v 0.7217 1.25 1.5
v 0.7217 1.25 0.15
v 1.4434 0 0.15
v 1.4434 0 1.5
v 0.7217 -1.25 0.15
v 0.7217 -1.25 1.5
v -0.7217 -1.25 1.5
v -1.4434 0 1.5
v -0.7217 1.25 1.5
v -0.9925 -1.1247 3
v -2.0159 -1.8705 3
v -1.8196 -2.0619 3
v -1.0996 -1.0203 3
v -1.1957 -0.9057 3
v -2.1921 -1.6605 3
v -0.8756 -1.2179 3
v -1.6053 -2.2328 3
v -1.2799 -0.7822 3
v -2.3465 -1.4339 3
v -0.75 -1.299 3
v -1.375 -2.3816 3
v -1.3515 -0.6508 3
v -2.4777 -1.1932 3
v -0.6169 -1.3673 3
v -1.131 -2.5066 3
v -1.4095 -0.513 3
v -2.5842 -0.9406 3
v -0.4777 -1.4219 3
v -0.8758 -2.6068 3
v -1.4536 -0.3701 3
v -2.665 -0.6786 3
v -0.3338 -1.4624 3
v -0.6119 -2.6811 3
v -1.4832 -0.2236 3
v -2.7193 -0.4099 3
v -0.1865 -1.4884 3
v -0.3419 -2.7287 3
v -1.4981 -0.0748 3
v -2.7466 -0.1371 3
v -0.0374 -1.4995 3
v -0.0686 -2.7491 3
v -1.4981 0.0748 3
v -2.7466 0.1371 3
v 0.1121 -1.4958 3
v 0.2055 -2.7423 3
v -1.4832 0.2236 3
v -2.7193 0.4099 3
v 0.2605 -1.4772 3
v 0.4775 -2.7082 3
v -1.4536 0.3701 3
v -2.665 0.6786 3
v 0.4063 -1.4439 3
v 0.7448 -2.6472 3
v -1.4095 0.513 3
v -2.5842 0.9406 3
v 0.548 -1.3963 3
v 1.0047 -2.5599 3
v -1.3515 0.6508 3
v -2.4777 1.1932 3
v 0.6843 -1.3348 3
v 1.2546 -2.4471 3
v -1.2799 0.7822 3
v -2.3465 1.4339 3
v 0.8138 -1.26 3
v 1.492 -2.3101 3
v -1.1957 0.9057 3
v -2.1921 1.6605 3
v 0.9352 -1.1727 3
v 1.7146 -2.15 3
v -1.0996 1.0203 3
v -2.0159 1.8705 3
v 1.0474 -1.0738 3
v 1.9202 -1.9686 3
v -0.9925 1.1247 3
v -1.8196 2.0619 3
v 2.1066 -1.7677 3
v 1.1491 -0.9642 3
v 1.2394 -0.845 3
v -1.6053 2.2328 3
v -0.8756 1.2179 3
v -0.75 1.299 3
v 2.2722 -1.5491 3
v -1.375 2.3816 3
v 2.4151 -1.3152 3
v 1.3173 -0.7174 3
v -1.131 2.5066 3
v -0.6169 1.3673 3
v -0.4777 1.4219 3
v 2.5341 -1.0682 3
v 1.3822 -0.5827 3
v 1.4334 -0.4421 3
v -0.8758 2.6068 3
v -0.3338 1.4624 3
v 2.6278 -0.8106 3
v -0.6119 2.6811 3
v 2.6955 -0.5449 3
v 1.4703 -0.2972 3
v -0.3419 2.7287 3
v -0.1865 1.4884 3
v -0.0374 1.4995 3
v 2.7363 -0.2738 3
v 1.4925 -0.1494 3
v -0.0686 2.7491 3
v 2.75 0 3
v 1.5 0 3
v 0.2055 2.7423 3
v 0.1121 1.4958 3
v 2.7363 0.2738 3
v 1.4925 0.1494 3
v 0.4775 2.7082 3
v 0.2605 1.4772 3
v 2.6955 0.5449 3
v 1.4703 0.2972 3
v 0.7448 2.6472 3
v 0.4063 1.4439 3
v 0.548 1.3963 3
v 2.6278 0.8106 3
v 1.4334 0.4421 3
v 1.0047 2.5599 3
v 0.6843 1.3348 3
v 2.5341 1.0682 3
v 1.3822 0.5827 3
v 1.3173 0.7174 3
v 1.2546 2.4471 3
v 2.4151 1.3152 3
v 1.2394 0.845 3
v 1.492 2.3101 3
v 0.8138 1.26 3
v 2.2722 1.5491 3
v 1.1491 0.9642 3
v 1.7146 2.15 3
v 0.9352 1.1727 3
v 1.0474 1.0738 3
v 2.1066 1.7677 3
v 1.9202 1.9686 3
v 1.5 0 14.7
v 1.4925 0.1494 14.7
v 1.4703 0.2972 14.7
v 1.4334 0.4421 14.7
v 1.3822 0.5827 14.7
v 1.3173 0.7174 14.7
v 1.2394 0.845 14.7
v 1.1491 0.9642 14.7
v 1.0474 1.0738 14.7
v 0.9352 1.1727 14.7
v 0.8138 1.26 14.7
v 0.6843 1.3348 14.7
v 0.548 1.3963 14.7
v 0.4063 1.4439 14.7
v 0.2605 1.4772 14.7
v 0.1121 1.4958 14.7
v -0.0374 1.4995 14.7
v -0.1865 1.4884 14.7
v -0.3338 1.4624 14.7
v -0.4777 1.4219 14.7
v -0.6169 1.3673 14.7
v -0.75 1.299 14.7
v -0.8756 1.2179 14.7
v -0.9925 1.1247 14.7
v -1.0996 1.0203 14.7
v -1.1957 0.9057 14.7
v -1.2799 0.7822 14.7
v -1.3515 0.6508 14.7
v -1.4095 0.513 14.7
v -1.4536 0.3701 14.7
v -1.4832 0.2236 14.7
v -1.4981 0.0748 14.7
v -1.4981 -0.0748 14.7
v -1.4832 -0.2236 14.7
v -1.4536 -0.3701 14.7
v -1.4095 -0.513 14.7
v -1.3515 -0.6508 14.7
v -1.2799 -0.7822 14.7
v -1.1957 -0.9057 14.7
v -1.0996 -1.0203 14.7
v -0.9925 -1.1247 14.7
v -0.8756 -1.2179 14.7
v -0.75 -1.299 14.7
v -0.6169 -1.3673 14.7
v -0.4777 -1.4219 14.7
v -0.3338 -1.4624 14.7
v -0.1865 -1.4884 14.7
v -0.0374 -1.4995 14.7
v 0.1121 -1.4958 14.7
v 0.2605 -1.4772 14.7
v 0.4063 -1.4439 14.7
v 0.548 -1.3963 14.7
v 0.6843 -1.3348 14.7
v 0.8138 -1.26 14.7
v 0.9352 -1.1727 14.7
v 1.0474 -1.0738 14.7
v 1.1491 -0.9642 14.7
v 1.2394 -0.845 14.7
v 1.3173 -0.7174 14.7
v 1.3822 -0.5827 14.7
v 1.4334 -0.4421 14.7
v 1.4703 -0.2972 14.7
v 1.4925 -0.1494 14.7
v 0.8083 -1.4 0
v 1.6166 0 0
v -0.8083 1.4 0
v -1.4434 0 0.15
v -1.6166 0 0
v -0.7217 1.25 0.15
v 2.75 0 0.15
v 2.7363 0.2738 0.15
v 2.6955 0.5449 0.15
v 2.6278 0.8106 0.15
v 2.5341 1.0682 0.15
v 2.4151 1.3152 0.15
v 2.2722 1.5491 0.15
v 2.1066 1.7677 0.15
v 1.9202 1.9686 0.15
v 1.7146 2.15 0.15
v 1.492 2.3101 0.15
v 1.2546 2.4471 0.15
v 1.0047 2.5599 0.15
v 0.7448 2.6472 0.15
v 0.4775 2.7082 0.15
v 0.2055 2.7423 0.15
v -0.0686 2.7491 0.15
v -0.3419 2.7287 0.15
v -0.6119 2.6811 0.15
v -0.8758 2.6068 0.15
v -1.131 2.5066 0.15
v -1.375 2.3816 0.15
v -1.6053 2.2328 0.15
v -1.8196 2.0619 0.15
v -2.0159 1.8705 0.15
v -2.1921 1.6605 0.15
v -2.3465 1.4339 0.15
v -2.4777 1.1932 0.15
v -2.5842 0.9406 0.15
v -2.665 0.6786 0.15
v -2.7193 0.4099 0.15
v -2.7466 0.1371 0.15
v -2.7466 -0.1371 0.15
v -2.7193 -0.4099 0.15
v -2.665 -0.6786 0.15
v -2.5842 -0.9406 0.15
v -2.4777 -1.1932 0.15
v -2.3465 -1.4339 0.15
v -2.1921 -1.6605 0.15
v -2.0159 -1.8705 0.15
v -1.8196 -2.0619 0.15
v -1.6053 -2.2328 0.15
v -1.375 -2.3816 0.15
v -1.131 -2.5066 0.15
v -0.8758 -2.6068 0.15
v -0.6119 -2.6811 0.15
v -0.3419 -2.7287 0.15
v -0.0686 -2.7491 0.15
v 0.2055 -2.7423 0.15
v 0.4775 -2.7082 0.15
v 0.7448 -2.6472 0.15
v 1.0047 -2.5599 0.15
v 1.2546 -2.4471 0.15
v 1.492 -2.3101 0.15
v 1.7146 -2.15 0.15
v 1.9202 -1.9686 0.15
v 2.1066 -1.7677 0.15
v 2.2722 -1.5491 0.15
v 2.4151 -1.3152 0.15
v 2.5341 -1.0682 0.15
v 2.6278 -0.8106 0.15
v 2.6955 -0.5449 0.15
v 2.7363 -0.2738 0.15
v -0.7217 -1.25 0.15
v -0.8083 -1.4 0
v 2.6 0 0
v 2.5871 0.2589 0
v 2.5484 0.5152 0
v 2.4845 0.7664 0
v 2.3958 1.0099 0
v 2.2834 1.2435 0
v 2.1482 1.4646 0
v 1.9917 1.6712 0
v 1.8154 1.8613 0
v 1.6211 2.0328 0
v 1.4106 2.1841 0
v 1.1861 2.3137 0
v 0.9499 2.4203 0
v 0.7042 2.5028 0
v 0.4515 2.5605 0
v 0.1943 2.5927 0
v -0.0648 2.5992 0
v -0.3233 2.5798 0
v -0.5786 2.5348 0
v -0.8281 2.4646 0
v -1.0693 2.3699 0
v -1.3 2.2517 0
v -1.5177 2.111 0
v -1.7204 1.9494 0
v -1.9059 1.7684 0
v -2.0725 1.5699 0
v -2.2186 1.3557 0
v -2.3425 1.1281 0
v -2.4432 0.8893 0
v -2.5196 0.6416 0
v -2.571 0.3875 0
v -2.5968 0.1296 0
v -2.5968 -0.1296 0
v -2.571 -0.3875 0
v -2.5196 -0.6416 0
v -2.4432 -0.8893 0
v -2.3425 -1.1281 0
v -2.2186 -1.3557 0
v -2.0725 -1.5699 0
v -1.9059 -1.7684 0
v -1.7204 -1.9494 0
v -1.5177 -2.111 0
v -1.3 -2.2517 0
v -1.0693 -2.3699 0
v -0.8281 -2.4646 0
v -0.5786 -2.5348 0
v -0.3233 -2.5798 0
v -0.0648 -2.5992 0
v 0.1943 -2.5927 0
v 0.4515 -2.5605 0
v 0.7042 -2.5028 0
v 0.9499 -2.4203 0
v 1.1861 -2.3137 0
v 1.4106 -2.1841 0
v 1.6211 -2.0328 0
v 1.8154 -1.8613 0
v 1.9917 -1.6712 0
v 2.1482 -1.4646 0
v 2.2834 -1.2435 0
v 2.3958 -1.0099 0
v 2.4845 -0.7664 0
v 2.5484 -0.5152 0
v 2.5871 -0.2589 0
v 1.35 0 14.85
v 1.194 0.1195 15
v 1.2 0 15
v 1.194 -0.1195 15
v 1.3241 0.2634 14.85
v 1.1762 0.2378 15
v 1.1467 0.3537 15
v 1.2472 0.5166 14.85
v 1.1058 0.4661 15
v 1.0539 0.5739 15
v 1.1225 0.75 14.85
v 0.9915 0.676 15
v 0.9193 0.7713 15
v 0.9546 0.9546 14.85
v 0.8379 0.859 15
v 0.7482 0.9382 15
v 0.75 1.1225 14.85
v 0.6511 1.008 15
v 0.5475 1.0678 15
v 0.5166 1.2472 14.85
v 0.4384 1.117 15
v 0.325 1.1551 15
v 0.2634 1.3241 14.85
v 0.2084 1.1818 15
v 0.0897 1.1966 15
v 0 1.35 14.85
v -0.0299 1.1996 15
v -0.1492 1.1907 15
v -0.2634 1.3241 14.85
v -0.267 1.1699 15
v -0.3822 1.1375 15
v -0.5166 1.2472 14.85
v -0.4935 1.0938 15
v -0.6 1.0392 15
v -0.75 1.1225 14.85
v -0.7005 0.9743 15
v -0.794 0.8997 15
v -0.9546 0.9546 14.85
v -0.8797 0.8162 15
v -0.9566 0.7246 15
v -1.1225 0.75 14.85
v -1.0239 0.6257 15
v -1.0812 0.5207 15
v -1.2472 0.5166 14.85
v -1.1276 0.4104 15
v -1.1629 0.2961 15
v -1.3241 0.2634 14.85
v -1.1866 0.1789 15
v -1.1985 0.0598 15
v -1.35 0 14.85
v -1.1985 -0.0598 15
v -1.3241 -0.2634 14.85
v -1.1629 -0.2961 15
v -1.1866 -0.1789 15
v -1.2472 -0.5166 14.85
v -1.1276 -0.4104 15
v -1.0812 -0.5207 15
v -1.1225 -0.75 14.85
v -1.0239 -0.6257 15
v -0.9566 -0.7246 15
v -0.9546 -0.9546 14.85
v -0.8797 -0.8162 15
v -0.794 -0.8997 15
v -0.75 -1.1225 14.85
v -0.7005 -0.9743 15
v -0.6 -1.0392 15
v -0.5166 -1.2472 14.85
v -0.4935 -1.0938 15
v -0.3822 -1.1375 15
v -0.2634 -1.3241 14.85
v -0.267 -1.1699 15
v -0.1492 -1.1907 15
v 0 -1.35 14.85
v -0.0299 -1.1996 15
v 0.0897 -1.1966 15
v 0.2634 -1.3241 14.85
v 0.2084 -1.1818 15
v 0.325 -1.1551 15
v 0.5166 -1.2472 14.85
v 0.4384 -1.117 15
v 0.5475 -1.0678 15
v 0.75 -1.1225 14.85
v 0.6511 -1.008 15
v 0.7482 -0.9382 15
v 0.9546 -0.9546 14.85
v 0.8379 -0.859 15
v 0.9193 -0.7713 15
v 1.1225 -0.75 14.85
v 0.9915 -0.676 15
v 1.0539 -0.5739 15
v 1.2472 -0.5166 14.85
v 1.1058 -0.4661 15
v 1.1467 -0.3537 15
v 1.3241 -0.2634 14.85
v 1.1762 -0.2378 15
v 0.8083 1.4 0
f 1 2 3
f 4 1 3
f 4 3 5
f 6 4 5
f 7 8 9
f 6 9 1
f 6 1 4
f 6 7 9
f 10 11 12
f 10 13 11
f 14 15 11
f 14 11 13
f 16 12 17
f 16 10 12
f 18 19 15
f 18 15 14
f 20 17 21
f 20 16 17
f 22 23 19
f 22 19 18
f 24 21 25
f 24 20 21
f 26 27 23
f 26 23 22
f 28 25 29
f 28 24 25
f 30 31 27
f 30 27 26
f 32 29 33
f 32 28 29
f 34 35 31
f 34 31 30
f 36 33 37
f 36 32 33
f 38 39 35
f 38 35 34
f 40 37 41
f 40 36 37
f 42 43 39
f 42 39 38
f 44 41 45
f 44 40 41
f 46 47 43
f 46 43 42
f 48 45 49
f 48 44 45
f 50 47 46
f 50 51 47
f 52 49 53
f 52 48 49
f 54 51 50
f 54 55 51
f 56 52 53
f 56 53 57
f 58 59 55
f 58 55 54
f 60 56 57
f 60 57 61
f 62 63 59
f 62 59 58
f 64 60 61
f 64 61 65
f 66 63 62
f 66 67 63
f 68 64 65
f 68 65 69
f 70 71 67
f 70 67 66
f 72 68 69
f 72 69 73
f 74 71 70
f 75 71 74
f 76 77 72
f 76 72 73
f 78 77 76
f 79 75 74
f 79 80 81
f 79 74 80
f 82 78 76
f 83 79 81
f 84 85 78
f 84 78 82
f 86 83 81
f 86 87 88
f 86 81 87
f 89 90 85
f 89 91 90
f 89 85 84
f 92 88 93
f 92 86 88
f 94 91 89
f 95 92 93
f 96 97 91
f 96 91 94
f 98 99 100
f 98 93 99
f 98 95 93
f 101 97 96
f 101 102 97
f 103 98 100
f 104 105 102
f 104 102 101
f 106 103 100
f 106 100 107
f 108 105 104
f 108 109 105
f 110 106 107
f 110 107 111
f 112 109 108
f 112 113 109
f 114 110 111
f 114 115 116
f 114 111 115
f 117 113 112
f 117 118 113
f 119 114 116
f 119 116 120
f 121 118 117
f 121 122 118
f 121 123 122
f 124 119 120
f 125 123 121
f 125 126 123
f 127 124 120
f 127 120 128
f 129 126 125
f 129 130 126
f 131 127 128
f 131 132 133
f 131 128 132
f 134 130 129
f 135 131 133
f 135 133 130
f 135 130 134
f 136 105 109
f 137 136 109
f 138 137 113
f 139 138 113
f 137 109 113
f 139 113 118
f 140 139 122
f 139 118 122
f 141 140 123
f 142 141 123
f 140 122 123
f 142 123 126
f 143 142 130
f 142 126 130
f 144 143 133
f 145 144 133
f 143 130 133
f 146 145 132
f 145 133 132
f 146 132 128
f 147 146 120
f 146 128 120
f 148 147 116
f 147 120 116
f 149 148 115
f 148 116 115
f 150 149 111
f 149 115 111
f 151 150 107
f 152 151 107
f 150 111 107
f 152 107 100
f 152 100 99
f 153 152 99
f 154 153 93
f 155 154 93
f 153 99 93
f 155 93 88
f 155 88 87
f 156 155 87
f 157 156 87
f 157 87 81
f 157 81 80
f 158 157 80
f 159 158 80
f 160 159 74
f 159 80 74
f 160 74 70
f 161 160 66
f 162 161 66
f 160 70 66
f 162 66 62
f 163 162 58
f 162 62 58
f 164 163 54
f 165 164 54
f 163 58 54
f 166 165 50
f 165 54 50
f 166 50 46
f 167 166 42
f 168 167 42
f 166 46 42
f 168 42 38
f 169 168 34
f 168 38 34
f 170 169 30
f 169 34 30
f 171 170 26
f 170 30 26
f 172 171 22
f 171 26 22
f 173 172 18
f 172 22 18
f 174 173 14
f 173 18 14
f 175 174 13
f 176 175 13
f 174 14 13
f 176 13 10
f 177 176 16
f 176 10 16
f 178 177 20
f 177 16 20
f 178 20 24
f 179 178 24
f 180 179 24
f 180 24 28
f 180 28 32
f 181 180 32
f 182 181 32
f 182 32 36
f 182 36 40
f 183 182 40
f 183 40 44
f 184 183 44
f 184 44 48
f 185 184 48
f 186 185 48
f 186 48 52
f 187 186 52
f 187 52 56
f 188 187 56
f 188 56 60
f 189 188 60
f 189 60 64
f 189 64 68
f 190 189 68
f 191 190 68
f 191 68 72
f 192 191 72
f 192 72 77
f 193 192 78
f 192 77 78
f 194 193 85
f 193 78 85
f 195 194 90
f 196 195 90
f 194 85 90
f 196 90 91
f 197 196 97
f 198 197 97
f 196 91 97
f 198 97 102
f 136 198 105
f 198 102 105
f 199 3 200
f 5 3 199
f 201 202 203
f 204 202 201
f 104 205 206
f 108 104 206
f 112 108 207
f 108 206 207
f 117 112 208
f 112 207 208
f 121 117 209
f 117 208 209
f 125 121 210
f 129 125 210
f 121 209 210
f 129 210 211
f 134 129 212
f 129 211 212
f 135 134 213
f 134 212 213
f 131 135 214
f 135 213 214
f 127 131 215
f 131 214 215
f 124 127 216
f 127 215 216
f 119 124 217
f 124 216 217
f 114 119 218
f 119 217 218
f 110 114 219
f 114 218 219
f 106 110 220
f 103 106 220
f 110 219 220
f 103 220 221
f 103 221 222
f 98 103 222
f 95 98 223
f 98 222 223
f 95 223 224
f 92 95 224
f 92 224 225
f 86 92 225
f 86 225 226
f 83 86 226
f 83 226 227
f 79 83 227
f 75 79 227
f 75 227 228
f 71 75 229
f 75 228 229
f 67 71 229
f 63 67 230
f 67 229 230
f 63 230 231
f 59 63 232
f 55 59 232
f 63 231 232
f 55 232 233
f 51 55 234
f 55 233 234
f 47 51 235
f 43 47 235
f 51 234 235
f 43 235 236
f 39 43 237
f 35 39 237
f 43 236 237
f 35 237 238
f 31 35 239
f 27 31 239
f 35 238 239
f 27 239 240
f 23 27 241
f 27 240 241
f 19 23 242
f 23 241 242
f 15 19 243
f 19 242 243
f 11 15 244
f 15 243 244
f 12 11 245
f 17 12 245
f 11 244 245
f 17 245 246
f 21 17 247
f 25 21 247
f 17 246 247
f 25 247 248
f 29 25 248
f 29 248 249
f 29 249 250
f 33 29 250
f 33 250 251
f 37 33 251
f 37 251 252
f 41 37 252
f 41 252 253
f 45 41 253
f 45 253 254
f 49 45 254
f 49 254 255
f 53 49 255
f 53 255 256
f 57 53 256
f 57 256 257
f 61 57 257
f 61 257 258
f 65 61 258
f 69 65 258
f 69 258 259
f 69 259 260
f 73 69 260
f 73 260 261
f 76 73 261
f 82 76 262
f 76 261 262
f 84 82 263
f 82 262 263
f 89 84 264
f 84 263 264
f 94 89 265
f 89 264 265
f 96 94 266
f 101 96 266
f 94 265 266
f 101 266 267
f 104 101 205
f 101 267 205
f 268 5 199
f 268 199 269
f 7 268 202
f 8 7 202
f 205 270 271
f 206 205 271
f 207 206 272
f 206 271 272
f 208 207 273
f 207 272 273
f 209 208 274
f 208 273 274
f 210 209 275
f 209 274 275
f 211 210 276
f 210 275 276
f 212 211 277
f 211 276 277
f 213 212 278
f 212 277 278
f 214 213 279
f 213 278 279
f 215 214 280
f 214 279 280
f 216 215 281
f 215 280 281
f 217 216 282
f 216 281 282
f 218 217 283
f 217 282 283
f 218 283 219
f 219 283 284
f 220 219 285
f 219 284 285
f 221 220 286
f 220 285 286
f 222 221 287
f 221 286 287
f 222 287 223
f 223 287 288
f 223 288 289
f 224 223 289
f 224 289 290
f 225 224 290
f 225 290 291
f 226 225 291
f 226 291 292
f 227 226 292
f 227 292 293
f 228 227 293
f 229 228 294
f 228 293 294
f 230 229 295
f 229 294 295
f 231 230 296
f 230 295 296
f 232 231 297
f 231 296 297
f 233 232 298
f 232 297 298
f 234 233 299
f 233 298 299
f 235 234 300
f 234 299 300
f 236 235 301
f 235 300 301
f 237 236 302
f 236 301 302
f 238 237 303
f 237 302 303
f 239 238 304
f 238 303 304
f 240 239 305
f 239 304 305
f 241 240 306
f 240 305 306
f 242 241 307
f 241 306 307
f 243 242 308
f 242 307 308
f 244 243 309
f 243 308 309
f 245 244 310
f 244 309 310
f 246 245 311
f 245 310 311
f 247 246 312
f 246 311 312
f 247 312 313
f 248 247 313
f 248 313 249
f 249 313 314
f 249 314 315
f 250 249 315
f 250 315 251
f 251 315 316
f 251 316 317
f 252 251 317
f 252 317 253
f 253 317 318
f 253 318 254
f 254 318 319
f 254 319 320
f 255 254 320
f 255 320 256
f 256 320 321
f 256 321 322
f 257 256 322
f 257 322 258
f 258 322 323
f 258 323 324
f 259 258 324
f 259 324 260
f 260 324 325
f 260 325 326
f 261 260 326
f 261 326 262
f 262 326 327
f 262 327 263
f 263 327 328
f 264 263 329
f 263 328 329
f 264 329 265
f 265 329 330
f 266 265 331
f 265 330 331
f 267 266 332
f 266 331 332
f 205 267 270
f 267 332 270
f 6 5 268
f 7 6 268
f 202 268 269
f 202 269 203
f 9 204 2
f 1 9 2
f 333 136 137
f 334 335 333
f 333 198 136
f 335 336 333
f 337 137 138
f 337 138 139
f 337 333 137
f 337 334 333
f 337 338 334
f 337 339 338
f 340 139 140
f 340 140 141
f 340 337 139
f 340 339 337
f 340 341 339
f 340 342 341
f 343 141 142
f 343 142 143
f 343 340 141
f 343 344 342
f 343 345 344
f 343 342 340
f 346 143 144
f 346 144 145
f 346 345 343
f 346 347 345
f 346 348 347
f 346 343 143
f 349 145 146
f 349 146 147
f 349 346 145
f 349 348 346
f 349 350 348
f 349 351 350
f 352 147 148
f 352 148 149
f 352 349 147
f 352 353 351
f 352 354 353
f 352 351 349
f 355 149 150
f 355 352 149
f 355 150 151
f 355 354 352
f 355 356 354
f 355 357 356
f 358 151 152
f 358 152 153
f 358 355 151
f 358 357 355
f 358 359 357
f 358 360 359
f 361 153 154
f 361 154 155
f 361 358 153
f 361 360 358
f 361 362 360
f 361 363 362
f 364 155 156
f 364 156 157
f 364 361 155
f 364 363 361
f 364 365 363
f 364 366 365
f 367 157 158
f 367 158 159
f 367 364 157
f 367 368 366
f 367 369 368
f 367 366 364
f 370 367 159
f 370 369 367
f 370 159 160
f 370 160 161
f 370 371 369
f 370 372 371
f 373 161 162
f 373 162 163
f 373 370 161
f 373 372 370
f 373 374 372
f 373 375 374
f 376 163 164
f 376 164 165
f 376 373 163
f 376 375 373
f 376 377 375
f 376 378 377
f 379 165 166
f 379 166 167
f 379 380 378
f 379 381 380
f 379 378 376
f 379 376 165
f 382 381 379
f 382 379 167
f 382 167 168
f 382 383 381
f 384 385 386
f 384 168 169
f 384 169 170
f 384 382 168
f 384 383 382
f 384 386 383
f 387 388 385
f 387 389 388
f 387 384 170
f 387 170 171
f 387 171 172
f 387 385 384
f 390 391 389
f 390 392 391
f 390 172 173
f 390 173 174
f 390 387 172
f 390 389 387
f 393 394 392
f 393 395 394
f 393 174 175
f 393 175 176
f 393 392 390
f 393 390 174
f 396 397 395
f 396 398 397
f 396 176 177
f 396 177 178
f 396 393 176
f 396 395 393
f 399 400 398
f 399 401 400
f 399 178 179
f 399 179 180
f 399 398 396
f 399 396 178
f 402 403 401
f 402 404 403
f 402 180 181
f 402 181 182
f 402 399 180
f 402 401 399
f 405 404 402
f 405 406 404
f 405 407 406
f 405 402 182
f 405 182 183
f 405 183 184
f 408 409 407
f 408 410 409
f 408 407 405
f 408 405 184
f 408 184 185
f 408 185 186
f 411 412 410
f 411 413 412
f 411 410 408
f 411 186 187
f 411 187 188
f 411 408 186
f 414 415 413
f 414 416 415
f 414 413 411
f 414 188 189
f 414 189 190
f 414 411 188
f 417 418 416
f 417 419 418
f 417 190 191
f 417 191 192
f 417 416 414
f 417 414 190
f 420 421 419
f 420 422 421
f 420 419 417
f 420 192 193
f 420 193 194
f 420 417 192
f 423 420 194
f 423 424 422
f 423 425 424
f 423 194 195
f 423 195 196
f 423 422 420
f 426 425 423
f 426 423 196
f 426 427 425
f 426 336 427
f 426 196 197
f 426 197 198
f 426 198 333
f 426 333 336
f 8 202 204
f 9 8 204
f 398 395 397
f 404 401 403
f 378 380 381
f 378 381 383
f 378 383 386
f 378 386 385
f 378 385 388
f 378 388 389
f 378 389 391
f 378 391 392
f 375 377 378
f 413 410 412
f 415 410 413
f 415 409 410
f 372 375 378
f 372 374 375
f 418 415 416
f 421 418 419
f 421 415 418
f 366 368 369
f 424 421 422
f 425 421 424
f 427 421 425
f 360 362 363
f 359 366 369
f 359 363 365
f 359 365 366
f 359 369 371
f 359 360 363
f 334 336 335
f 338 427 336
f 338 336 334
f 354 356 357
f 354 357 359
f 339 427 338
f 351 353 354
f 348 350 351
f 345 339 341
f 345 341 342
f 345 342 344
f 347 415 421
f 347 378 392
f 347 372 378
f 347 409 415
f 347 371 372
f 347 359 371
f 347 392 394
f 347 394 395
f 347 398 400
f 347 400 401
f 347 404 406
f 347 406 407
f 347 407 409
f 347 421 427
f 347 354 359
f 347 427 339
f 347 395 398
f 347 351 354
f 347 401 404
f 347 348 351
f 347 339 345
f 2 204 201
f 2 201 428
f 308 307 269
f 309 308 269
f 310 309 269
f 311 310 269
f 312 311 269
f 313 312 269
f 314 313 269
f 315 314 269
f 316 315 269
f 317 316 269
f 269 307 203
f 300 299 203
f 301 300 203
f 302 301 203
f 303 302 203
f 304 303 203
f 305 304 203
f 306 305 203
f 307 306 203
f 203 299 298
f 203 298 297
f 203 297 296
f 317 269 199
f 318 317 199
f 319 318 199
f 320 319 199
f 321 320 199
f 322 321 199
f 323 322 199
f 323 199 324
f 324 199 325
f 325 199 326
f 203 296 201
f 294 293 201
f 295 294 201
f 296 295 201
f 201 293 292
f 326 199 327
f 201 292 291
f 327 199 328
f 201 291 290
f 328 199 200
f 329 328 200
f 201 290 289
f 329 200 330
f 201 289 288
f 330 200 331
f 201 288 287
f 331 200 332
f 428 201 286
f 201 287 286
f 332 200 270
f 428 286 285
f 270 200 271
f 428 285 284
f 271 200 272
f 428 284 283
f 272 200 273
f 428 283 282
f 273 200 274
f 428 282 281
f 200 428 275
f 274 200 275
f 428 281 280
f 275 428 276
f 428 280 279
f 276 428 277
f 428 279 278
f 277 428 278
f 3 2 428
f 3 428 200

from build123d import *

# Parameters (mm, degrees)
F3_R     = 2.75
F4_DEPTH = 3
F6_DEPTH = 1.5
F7_R     = 1.5
F8_DEPTH = 12
F9_SIZE  = 0.15
F10_SIZE = 0.3


with BuildPart() as f4:
    # F3 (on Top) → F4 (new body)
    with BuildSketch(Plane.XY):
        Circle(F3_R)
    extrude(amount=F4_DEPTH)

    # F5 (on face) → F6 (cut)
    with BuildSketch(Plane(origin=(0, 0, 0), x_dir=(1, 0, 0), z_dir=(0, 0, -1))):
        Polygon((0.7216878365, 1.25), (-0.7216878365, 1.25), (-1.443375673, 0), (-0.7216878365, -1.25), (0.7216878365, -1.25), (1.443375673, 0), align=None)
    extrude(amount=-F6_DEPTH, mode=Mode.SUBTRACT)

    # F7 (on face) → F8 (join)
    with BuildSketch(Plane.XY.offset(3)):
        Circle(F7_R)
    extrude(amount=F8_DEPTH)

    # F9
    f9_edges = [f4.edges().sort_by_distance(p)[0] for p in [
        (-2.75, 0, 0),
        (0, -1.25, 0),
        (1.082532, -0.625, 0),
        (1.082532, 0.625, 0),
        (0, 1.25, 0),
        (-1.082532, -0.625, 0),
        (-1.082532, 0.625, 0),
    ]]
    chamfer(f9_edges, length=F9_SIZE)

    # F10
    f10_edges = [f4.edges().sort_by_distance(p)[0] for p in [
        (-1.5, 0, 15),
    ]]
    chamfer(f10_edges, length=F10_SIZE)


solid = f4.part
